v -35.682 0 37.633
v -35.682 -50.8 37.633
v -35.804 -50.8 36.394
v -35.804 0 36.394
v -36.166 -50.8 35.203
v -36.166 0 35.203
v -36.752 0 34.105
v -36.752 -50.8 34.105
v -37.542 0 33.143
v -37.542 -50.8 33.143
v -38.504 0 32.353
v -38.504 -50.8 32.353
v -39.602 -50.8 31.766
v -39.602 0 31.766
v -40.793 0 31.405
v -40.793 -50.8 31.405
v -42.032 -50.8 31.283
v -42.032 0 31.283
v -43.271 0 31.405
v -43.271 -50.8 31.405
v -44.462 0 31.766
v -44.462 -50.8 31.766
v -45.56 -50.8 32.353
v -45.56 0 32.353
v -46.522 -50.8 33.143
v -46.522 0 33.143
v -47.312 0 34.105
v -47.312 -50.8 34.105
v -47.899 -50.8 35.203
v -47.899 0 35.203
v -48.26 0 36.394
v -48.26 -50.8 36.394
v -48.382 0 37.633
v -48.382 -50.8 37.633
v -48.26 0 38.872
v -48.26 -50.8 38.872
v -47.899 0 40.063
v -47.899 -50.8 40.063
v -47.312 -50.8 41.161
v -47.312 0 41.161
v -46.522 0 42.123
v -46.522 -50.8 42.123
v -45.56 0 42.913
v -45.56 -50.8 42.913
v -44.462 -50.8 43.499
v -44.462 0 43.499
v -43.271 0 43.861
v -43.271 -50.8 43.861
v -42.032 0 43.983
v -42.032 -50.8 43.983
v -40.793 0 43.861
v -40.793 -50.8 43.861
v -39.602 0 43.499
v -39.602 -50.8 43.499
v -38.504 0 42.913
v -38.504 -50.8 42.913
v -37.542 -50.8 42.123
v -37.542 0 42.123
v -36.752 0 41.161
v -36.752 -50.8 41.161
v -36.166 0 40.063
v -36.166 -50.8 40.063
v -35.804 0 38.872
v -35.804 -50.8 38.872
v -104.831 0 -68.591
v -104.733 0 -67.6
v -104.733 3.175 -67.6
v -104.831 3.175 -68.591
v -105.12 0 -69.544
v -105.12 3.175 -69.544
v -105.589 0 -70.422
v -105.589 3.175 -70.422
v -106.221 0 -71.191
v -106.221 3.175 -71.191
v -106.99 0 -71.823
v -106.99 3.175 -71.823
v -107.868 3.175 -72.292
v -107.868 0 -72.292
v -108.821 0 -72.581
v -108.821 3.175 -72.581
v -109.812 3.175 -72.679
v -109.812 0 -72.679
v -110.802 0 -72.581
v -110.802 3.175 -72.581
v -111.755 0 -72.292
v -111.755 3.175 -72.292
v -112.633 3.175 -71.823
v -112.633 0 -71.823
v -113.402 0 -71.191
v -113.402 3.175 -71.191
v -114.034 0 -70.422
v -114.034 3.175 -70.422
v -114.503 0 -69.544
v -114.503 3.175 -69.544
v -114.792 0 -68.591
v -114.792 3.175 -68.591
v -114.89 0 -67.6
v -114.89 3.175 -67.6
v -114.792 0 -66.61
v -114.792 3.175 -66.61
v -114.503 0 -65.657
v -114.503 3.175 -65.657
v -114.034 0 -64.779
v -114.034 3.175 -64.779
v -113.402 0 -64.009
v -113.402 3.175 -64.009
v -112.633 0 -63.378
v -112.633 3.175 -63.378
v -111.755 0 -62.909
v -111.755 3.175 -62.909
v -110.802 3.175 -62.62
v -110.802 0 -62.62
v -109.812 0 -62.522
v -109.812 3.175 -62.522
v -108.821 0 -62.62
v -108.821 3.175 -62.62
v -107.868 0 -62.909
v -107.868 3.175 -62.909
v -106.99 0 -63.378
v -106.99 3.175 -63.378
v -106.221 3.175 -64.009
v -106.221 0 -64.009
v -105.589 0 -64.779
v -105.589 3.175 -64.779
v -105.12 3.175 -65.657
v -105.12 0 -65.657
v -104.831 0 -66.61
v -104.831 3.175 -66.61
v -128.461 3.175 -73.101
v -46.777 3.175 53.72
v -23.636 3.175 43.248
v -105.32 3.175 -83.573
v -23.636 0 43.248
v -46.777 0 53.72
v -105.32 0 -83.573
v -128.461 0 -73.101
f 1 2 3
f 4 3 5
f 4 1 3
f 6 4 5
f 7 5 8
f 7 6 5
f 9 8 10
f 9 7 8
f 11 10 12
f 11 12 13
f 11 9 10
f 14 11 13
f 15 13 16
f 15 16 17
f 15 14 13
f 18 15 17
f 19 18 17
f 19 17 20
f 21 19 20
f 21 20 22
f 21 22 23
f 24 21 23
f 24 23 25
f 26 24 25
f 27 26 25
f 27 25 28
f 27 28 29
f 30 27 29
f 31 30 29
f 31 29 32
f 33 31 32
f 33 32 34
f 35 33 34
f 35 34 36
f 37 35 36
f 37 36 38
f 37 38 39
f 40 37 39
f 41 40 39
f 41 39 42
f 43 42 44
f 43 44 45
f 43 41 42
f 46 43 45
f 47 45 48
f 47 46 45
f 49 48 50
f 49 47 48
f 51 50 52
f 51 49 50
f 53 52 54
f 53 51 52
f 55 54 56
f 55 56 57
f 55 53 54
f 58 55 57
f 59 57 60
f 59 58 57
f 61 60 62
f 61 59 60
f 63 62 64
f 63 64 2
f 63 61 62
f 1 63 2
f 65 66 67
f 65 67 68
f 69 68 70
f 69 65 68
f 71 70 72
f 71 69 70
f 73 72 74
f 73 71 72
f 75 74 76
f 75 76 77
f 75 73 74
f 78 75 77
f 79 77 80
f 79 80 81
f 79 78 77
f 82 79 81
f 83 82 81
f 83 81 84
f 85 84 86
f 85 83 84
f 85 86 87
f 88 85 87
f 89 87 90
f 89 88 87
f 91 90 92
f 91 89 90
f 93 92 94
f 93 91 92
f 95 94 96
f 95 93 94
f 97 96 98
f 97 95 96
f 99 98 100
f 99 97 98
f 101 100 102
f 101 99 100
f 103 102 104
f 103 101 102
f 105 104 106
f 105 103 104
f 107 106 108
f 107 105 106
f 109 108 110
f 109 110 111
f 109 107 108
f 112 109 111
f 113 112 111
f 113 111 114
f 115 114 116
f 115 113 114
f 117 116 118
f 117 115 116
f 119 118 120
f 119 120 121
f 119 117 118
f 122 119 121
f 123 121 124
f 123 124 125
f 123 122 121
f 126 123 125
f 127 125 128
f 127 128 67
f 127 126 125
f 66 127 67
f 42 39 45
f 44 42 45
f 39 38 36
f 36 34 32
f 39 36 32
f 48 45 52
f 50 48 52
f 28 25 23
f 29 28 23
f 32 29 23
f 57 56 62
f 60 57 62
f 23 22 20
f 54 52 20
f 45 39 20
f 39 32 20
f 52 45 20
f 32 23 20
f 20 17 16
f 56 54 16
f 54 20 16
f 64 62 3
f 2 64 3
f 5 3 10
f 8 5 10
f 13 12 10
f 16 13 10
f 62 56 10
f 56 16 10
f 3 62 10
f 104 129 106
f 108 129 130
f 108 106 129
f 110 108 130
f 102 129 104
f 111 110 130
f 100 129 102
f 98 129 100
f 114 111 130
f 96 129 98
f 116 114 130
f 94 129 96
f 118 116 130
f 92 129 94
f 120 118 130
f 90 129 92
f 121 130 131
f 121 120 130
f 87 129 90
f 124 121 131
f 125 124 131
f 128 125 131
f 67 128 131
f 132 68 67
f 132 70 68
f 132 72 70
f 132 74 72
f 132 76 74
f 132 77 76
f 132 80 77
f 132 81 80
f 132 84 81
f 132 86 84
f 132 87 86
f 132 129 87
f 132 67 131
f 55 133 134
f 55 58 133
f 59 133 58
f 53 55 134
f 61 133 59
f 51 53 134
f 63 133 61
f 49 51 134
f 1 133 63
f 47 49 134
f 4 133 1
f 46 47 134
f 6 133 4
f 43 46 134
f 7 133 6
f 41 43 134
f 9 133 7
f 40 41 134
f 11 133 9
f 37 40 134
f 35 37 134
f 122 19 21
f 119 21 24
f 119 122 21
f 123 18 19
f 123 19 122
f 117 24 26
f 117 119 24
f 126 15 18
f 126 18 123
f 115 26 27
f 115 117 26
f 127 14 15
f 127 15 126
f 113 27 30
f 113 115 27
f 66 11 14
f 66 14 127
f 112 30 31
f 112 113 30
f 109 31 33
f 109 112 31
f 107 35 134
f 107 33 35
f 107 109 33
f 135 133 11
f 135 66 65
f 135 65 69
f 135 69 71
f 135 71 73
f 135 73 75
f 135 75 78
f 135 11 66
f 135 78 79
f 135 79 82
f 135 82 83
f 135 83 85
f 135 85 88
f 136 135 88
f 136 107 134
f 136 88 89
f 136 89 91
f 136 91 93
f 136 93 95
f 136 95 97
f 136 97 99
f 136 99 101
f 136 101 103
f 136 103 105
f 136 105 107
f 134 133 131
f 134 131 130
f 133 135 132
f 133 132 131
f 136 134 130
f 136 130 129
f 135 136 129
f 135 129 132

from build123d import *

# Parameters (mm, degrees)
SKETCH1_R           = 5.078298903
BOSS_EXTRUDE1_DEPTH = 3.175
SKETCH2_R           = 6.35
BOSS_EXTRUDE2_DEPTH = 53.975


with BuildPart() as part:
    # Sketch1 → Boss-Extrude1 (new body)
    with BuildSketch(Plane(origin=(0, 0, 0), x_dir=(1, 0, 0), z_dir=(0, 1, 0))):
        Polygon((-46.777175674, -53.719844845), (-128.460753109, 73.100956593), (-105.319843222, 83.572742001), (-23.636265787, -43.248059437), align=None)
        with Locations((-109.811555345, 67.600325735)):
            Circle(SKETCH1_R, mode=Mode.SUBTRACT)
    extrude(amount=BOSS_EXTRUDE1_DEPTH)

    # Sketch2 → Boss-Extrude2 (add)
    with BuildSketch(Plane(origin=(0, 3.175, 0), x_dir=(1, 0, 0), z_dir=(0, 1, 0))):
        with Locations((-42.032274904, -37.632854988)):
            Circle(SKETCH2_R)
    extrude(amount=-BOSS_EXTRUDE2_DEPTH)


solid = part.part
